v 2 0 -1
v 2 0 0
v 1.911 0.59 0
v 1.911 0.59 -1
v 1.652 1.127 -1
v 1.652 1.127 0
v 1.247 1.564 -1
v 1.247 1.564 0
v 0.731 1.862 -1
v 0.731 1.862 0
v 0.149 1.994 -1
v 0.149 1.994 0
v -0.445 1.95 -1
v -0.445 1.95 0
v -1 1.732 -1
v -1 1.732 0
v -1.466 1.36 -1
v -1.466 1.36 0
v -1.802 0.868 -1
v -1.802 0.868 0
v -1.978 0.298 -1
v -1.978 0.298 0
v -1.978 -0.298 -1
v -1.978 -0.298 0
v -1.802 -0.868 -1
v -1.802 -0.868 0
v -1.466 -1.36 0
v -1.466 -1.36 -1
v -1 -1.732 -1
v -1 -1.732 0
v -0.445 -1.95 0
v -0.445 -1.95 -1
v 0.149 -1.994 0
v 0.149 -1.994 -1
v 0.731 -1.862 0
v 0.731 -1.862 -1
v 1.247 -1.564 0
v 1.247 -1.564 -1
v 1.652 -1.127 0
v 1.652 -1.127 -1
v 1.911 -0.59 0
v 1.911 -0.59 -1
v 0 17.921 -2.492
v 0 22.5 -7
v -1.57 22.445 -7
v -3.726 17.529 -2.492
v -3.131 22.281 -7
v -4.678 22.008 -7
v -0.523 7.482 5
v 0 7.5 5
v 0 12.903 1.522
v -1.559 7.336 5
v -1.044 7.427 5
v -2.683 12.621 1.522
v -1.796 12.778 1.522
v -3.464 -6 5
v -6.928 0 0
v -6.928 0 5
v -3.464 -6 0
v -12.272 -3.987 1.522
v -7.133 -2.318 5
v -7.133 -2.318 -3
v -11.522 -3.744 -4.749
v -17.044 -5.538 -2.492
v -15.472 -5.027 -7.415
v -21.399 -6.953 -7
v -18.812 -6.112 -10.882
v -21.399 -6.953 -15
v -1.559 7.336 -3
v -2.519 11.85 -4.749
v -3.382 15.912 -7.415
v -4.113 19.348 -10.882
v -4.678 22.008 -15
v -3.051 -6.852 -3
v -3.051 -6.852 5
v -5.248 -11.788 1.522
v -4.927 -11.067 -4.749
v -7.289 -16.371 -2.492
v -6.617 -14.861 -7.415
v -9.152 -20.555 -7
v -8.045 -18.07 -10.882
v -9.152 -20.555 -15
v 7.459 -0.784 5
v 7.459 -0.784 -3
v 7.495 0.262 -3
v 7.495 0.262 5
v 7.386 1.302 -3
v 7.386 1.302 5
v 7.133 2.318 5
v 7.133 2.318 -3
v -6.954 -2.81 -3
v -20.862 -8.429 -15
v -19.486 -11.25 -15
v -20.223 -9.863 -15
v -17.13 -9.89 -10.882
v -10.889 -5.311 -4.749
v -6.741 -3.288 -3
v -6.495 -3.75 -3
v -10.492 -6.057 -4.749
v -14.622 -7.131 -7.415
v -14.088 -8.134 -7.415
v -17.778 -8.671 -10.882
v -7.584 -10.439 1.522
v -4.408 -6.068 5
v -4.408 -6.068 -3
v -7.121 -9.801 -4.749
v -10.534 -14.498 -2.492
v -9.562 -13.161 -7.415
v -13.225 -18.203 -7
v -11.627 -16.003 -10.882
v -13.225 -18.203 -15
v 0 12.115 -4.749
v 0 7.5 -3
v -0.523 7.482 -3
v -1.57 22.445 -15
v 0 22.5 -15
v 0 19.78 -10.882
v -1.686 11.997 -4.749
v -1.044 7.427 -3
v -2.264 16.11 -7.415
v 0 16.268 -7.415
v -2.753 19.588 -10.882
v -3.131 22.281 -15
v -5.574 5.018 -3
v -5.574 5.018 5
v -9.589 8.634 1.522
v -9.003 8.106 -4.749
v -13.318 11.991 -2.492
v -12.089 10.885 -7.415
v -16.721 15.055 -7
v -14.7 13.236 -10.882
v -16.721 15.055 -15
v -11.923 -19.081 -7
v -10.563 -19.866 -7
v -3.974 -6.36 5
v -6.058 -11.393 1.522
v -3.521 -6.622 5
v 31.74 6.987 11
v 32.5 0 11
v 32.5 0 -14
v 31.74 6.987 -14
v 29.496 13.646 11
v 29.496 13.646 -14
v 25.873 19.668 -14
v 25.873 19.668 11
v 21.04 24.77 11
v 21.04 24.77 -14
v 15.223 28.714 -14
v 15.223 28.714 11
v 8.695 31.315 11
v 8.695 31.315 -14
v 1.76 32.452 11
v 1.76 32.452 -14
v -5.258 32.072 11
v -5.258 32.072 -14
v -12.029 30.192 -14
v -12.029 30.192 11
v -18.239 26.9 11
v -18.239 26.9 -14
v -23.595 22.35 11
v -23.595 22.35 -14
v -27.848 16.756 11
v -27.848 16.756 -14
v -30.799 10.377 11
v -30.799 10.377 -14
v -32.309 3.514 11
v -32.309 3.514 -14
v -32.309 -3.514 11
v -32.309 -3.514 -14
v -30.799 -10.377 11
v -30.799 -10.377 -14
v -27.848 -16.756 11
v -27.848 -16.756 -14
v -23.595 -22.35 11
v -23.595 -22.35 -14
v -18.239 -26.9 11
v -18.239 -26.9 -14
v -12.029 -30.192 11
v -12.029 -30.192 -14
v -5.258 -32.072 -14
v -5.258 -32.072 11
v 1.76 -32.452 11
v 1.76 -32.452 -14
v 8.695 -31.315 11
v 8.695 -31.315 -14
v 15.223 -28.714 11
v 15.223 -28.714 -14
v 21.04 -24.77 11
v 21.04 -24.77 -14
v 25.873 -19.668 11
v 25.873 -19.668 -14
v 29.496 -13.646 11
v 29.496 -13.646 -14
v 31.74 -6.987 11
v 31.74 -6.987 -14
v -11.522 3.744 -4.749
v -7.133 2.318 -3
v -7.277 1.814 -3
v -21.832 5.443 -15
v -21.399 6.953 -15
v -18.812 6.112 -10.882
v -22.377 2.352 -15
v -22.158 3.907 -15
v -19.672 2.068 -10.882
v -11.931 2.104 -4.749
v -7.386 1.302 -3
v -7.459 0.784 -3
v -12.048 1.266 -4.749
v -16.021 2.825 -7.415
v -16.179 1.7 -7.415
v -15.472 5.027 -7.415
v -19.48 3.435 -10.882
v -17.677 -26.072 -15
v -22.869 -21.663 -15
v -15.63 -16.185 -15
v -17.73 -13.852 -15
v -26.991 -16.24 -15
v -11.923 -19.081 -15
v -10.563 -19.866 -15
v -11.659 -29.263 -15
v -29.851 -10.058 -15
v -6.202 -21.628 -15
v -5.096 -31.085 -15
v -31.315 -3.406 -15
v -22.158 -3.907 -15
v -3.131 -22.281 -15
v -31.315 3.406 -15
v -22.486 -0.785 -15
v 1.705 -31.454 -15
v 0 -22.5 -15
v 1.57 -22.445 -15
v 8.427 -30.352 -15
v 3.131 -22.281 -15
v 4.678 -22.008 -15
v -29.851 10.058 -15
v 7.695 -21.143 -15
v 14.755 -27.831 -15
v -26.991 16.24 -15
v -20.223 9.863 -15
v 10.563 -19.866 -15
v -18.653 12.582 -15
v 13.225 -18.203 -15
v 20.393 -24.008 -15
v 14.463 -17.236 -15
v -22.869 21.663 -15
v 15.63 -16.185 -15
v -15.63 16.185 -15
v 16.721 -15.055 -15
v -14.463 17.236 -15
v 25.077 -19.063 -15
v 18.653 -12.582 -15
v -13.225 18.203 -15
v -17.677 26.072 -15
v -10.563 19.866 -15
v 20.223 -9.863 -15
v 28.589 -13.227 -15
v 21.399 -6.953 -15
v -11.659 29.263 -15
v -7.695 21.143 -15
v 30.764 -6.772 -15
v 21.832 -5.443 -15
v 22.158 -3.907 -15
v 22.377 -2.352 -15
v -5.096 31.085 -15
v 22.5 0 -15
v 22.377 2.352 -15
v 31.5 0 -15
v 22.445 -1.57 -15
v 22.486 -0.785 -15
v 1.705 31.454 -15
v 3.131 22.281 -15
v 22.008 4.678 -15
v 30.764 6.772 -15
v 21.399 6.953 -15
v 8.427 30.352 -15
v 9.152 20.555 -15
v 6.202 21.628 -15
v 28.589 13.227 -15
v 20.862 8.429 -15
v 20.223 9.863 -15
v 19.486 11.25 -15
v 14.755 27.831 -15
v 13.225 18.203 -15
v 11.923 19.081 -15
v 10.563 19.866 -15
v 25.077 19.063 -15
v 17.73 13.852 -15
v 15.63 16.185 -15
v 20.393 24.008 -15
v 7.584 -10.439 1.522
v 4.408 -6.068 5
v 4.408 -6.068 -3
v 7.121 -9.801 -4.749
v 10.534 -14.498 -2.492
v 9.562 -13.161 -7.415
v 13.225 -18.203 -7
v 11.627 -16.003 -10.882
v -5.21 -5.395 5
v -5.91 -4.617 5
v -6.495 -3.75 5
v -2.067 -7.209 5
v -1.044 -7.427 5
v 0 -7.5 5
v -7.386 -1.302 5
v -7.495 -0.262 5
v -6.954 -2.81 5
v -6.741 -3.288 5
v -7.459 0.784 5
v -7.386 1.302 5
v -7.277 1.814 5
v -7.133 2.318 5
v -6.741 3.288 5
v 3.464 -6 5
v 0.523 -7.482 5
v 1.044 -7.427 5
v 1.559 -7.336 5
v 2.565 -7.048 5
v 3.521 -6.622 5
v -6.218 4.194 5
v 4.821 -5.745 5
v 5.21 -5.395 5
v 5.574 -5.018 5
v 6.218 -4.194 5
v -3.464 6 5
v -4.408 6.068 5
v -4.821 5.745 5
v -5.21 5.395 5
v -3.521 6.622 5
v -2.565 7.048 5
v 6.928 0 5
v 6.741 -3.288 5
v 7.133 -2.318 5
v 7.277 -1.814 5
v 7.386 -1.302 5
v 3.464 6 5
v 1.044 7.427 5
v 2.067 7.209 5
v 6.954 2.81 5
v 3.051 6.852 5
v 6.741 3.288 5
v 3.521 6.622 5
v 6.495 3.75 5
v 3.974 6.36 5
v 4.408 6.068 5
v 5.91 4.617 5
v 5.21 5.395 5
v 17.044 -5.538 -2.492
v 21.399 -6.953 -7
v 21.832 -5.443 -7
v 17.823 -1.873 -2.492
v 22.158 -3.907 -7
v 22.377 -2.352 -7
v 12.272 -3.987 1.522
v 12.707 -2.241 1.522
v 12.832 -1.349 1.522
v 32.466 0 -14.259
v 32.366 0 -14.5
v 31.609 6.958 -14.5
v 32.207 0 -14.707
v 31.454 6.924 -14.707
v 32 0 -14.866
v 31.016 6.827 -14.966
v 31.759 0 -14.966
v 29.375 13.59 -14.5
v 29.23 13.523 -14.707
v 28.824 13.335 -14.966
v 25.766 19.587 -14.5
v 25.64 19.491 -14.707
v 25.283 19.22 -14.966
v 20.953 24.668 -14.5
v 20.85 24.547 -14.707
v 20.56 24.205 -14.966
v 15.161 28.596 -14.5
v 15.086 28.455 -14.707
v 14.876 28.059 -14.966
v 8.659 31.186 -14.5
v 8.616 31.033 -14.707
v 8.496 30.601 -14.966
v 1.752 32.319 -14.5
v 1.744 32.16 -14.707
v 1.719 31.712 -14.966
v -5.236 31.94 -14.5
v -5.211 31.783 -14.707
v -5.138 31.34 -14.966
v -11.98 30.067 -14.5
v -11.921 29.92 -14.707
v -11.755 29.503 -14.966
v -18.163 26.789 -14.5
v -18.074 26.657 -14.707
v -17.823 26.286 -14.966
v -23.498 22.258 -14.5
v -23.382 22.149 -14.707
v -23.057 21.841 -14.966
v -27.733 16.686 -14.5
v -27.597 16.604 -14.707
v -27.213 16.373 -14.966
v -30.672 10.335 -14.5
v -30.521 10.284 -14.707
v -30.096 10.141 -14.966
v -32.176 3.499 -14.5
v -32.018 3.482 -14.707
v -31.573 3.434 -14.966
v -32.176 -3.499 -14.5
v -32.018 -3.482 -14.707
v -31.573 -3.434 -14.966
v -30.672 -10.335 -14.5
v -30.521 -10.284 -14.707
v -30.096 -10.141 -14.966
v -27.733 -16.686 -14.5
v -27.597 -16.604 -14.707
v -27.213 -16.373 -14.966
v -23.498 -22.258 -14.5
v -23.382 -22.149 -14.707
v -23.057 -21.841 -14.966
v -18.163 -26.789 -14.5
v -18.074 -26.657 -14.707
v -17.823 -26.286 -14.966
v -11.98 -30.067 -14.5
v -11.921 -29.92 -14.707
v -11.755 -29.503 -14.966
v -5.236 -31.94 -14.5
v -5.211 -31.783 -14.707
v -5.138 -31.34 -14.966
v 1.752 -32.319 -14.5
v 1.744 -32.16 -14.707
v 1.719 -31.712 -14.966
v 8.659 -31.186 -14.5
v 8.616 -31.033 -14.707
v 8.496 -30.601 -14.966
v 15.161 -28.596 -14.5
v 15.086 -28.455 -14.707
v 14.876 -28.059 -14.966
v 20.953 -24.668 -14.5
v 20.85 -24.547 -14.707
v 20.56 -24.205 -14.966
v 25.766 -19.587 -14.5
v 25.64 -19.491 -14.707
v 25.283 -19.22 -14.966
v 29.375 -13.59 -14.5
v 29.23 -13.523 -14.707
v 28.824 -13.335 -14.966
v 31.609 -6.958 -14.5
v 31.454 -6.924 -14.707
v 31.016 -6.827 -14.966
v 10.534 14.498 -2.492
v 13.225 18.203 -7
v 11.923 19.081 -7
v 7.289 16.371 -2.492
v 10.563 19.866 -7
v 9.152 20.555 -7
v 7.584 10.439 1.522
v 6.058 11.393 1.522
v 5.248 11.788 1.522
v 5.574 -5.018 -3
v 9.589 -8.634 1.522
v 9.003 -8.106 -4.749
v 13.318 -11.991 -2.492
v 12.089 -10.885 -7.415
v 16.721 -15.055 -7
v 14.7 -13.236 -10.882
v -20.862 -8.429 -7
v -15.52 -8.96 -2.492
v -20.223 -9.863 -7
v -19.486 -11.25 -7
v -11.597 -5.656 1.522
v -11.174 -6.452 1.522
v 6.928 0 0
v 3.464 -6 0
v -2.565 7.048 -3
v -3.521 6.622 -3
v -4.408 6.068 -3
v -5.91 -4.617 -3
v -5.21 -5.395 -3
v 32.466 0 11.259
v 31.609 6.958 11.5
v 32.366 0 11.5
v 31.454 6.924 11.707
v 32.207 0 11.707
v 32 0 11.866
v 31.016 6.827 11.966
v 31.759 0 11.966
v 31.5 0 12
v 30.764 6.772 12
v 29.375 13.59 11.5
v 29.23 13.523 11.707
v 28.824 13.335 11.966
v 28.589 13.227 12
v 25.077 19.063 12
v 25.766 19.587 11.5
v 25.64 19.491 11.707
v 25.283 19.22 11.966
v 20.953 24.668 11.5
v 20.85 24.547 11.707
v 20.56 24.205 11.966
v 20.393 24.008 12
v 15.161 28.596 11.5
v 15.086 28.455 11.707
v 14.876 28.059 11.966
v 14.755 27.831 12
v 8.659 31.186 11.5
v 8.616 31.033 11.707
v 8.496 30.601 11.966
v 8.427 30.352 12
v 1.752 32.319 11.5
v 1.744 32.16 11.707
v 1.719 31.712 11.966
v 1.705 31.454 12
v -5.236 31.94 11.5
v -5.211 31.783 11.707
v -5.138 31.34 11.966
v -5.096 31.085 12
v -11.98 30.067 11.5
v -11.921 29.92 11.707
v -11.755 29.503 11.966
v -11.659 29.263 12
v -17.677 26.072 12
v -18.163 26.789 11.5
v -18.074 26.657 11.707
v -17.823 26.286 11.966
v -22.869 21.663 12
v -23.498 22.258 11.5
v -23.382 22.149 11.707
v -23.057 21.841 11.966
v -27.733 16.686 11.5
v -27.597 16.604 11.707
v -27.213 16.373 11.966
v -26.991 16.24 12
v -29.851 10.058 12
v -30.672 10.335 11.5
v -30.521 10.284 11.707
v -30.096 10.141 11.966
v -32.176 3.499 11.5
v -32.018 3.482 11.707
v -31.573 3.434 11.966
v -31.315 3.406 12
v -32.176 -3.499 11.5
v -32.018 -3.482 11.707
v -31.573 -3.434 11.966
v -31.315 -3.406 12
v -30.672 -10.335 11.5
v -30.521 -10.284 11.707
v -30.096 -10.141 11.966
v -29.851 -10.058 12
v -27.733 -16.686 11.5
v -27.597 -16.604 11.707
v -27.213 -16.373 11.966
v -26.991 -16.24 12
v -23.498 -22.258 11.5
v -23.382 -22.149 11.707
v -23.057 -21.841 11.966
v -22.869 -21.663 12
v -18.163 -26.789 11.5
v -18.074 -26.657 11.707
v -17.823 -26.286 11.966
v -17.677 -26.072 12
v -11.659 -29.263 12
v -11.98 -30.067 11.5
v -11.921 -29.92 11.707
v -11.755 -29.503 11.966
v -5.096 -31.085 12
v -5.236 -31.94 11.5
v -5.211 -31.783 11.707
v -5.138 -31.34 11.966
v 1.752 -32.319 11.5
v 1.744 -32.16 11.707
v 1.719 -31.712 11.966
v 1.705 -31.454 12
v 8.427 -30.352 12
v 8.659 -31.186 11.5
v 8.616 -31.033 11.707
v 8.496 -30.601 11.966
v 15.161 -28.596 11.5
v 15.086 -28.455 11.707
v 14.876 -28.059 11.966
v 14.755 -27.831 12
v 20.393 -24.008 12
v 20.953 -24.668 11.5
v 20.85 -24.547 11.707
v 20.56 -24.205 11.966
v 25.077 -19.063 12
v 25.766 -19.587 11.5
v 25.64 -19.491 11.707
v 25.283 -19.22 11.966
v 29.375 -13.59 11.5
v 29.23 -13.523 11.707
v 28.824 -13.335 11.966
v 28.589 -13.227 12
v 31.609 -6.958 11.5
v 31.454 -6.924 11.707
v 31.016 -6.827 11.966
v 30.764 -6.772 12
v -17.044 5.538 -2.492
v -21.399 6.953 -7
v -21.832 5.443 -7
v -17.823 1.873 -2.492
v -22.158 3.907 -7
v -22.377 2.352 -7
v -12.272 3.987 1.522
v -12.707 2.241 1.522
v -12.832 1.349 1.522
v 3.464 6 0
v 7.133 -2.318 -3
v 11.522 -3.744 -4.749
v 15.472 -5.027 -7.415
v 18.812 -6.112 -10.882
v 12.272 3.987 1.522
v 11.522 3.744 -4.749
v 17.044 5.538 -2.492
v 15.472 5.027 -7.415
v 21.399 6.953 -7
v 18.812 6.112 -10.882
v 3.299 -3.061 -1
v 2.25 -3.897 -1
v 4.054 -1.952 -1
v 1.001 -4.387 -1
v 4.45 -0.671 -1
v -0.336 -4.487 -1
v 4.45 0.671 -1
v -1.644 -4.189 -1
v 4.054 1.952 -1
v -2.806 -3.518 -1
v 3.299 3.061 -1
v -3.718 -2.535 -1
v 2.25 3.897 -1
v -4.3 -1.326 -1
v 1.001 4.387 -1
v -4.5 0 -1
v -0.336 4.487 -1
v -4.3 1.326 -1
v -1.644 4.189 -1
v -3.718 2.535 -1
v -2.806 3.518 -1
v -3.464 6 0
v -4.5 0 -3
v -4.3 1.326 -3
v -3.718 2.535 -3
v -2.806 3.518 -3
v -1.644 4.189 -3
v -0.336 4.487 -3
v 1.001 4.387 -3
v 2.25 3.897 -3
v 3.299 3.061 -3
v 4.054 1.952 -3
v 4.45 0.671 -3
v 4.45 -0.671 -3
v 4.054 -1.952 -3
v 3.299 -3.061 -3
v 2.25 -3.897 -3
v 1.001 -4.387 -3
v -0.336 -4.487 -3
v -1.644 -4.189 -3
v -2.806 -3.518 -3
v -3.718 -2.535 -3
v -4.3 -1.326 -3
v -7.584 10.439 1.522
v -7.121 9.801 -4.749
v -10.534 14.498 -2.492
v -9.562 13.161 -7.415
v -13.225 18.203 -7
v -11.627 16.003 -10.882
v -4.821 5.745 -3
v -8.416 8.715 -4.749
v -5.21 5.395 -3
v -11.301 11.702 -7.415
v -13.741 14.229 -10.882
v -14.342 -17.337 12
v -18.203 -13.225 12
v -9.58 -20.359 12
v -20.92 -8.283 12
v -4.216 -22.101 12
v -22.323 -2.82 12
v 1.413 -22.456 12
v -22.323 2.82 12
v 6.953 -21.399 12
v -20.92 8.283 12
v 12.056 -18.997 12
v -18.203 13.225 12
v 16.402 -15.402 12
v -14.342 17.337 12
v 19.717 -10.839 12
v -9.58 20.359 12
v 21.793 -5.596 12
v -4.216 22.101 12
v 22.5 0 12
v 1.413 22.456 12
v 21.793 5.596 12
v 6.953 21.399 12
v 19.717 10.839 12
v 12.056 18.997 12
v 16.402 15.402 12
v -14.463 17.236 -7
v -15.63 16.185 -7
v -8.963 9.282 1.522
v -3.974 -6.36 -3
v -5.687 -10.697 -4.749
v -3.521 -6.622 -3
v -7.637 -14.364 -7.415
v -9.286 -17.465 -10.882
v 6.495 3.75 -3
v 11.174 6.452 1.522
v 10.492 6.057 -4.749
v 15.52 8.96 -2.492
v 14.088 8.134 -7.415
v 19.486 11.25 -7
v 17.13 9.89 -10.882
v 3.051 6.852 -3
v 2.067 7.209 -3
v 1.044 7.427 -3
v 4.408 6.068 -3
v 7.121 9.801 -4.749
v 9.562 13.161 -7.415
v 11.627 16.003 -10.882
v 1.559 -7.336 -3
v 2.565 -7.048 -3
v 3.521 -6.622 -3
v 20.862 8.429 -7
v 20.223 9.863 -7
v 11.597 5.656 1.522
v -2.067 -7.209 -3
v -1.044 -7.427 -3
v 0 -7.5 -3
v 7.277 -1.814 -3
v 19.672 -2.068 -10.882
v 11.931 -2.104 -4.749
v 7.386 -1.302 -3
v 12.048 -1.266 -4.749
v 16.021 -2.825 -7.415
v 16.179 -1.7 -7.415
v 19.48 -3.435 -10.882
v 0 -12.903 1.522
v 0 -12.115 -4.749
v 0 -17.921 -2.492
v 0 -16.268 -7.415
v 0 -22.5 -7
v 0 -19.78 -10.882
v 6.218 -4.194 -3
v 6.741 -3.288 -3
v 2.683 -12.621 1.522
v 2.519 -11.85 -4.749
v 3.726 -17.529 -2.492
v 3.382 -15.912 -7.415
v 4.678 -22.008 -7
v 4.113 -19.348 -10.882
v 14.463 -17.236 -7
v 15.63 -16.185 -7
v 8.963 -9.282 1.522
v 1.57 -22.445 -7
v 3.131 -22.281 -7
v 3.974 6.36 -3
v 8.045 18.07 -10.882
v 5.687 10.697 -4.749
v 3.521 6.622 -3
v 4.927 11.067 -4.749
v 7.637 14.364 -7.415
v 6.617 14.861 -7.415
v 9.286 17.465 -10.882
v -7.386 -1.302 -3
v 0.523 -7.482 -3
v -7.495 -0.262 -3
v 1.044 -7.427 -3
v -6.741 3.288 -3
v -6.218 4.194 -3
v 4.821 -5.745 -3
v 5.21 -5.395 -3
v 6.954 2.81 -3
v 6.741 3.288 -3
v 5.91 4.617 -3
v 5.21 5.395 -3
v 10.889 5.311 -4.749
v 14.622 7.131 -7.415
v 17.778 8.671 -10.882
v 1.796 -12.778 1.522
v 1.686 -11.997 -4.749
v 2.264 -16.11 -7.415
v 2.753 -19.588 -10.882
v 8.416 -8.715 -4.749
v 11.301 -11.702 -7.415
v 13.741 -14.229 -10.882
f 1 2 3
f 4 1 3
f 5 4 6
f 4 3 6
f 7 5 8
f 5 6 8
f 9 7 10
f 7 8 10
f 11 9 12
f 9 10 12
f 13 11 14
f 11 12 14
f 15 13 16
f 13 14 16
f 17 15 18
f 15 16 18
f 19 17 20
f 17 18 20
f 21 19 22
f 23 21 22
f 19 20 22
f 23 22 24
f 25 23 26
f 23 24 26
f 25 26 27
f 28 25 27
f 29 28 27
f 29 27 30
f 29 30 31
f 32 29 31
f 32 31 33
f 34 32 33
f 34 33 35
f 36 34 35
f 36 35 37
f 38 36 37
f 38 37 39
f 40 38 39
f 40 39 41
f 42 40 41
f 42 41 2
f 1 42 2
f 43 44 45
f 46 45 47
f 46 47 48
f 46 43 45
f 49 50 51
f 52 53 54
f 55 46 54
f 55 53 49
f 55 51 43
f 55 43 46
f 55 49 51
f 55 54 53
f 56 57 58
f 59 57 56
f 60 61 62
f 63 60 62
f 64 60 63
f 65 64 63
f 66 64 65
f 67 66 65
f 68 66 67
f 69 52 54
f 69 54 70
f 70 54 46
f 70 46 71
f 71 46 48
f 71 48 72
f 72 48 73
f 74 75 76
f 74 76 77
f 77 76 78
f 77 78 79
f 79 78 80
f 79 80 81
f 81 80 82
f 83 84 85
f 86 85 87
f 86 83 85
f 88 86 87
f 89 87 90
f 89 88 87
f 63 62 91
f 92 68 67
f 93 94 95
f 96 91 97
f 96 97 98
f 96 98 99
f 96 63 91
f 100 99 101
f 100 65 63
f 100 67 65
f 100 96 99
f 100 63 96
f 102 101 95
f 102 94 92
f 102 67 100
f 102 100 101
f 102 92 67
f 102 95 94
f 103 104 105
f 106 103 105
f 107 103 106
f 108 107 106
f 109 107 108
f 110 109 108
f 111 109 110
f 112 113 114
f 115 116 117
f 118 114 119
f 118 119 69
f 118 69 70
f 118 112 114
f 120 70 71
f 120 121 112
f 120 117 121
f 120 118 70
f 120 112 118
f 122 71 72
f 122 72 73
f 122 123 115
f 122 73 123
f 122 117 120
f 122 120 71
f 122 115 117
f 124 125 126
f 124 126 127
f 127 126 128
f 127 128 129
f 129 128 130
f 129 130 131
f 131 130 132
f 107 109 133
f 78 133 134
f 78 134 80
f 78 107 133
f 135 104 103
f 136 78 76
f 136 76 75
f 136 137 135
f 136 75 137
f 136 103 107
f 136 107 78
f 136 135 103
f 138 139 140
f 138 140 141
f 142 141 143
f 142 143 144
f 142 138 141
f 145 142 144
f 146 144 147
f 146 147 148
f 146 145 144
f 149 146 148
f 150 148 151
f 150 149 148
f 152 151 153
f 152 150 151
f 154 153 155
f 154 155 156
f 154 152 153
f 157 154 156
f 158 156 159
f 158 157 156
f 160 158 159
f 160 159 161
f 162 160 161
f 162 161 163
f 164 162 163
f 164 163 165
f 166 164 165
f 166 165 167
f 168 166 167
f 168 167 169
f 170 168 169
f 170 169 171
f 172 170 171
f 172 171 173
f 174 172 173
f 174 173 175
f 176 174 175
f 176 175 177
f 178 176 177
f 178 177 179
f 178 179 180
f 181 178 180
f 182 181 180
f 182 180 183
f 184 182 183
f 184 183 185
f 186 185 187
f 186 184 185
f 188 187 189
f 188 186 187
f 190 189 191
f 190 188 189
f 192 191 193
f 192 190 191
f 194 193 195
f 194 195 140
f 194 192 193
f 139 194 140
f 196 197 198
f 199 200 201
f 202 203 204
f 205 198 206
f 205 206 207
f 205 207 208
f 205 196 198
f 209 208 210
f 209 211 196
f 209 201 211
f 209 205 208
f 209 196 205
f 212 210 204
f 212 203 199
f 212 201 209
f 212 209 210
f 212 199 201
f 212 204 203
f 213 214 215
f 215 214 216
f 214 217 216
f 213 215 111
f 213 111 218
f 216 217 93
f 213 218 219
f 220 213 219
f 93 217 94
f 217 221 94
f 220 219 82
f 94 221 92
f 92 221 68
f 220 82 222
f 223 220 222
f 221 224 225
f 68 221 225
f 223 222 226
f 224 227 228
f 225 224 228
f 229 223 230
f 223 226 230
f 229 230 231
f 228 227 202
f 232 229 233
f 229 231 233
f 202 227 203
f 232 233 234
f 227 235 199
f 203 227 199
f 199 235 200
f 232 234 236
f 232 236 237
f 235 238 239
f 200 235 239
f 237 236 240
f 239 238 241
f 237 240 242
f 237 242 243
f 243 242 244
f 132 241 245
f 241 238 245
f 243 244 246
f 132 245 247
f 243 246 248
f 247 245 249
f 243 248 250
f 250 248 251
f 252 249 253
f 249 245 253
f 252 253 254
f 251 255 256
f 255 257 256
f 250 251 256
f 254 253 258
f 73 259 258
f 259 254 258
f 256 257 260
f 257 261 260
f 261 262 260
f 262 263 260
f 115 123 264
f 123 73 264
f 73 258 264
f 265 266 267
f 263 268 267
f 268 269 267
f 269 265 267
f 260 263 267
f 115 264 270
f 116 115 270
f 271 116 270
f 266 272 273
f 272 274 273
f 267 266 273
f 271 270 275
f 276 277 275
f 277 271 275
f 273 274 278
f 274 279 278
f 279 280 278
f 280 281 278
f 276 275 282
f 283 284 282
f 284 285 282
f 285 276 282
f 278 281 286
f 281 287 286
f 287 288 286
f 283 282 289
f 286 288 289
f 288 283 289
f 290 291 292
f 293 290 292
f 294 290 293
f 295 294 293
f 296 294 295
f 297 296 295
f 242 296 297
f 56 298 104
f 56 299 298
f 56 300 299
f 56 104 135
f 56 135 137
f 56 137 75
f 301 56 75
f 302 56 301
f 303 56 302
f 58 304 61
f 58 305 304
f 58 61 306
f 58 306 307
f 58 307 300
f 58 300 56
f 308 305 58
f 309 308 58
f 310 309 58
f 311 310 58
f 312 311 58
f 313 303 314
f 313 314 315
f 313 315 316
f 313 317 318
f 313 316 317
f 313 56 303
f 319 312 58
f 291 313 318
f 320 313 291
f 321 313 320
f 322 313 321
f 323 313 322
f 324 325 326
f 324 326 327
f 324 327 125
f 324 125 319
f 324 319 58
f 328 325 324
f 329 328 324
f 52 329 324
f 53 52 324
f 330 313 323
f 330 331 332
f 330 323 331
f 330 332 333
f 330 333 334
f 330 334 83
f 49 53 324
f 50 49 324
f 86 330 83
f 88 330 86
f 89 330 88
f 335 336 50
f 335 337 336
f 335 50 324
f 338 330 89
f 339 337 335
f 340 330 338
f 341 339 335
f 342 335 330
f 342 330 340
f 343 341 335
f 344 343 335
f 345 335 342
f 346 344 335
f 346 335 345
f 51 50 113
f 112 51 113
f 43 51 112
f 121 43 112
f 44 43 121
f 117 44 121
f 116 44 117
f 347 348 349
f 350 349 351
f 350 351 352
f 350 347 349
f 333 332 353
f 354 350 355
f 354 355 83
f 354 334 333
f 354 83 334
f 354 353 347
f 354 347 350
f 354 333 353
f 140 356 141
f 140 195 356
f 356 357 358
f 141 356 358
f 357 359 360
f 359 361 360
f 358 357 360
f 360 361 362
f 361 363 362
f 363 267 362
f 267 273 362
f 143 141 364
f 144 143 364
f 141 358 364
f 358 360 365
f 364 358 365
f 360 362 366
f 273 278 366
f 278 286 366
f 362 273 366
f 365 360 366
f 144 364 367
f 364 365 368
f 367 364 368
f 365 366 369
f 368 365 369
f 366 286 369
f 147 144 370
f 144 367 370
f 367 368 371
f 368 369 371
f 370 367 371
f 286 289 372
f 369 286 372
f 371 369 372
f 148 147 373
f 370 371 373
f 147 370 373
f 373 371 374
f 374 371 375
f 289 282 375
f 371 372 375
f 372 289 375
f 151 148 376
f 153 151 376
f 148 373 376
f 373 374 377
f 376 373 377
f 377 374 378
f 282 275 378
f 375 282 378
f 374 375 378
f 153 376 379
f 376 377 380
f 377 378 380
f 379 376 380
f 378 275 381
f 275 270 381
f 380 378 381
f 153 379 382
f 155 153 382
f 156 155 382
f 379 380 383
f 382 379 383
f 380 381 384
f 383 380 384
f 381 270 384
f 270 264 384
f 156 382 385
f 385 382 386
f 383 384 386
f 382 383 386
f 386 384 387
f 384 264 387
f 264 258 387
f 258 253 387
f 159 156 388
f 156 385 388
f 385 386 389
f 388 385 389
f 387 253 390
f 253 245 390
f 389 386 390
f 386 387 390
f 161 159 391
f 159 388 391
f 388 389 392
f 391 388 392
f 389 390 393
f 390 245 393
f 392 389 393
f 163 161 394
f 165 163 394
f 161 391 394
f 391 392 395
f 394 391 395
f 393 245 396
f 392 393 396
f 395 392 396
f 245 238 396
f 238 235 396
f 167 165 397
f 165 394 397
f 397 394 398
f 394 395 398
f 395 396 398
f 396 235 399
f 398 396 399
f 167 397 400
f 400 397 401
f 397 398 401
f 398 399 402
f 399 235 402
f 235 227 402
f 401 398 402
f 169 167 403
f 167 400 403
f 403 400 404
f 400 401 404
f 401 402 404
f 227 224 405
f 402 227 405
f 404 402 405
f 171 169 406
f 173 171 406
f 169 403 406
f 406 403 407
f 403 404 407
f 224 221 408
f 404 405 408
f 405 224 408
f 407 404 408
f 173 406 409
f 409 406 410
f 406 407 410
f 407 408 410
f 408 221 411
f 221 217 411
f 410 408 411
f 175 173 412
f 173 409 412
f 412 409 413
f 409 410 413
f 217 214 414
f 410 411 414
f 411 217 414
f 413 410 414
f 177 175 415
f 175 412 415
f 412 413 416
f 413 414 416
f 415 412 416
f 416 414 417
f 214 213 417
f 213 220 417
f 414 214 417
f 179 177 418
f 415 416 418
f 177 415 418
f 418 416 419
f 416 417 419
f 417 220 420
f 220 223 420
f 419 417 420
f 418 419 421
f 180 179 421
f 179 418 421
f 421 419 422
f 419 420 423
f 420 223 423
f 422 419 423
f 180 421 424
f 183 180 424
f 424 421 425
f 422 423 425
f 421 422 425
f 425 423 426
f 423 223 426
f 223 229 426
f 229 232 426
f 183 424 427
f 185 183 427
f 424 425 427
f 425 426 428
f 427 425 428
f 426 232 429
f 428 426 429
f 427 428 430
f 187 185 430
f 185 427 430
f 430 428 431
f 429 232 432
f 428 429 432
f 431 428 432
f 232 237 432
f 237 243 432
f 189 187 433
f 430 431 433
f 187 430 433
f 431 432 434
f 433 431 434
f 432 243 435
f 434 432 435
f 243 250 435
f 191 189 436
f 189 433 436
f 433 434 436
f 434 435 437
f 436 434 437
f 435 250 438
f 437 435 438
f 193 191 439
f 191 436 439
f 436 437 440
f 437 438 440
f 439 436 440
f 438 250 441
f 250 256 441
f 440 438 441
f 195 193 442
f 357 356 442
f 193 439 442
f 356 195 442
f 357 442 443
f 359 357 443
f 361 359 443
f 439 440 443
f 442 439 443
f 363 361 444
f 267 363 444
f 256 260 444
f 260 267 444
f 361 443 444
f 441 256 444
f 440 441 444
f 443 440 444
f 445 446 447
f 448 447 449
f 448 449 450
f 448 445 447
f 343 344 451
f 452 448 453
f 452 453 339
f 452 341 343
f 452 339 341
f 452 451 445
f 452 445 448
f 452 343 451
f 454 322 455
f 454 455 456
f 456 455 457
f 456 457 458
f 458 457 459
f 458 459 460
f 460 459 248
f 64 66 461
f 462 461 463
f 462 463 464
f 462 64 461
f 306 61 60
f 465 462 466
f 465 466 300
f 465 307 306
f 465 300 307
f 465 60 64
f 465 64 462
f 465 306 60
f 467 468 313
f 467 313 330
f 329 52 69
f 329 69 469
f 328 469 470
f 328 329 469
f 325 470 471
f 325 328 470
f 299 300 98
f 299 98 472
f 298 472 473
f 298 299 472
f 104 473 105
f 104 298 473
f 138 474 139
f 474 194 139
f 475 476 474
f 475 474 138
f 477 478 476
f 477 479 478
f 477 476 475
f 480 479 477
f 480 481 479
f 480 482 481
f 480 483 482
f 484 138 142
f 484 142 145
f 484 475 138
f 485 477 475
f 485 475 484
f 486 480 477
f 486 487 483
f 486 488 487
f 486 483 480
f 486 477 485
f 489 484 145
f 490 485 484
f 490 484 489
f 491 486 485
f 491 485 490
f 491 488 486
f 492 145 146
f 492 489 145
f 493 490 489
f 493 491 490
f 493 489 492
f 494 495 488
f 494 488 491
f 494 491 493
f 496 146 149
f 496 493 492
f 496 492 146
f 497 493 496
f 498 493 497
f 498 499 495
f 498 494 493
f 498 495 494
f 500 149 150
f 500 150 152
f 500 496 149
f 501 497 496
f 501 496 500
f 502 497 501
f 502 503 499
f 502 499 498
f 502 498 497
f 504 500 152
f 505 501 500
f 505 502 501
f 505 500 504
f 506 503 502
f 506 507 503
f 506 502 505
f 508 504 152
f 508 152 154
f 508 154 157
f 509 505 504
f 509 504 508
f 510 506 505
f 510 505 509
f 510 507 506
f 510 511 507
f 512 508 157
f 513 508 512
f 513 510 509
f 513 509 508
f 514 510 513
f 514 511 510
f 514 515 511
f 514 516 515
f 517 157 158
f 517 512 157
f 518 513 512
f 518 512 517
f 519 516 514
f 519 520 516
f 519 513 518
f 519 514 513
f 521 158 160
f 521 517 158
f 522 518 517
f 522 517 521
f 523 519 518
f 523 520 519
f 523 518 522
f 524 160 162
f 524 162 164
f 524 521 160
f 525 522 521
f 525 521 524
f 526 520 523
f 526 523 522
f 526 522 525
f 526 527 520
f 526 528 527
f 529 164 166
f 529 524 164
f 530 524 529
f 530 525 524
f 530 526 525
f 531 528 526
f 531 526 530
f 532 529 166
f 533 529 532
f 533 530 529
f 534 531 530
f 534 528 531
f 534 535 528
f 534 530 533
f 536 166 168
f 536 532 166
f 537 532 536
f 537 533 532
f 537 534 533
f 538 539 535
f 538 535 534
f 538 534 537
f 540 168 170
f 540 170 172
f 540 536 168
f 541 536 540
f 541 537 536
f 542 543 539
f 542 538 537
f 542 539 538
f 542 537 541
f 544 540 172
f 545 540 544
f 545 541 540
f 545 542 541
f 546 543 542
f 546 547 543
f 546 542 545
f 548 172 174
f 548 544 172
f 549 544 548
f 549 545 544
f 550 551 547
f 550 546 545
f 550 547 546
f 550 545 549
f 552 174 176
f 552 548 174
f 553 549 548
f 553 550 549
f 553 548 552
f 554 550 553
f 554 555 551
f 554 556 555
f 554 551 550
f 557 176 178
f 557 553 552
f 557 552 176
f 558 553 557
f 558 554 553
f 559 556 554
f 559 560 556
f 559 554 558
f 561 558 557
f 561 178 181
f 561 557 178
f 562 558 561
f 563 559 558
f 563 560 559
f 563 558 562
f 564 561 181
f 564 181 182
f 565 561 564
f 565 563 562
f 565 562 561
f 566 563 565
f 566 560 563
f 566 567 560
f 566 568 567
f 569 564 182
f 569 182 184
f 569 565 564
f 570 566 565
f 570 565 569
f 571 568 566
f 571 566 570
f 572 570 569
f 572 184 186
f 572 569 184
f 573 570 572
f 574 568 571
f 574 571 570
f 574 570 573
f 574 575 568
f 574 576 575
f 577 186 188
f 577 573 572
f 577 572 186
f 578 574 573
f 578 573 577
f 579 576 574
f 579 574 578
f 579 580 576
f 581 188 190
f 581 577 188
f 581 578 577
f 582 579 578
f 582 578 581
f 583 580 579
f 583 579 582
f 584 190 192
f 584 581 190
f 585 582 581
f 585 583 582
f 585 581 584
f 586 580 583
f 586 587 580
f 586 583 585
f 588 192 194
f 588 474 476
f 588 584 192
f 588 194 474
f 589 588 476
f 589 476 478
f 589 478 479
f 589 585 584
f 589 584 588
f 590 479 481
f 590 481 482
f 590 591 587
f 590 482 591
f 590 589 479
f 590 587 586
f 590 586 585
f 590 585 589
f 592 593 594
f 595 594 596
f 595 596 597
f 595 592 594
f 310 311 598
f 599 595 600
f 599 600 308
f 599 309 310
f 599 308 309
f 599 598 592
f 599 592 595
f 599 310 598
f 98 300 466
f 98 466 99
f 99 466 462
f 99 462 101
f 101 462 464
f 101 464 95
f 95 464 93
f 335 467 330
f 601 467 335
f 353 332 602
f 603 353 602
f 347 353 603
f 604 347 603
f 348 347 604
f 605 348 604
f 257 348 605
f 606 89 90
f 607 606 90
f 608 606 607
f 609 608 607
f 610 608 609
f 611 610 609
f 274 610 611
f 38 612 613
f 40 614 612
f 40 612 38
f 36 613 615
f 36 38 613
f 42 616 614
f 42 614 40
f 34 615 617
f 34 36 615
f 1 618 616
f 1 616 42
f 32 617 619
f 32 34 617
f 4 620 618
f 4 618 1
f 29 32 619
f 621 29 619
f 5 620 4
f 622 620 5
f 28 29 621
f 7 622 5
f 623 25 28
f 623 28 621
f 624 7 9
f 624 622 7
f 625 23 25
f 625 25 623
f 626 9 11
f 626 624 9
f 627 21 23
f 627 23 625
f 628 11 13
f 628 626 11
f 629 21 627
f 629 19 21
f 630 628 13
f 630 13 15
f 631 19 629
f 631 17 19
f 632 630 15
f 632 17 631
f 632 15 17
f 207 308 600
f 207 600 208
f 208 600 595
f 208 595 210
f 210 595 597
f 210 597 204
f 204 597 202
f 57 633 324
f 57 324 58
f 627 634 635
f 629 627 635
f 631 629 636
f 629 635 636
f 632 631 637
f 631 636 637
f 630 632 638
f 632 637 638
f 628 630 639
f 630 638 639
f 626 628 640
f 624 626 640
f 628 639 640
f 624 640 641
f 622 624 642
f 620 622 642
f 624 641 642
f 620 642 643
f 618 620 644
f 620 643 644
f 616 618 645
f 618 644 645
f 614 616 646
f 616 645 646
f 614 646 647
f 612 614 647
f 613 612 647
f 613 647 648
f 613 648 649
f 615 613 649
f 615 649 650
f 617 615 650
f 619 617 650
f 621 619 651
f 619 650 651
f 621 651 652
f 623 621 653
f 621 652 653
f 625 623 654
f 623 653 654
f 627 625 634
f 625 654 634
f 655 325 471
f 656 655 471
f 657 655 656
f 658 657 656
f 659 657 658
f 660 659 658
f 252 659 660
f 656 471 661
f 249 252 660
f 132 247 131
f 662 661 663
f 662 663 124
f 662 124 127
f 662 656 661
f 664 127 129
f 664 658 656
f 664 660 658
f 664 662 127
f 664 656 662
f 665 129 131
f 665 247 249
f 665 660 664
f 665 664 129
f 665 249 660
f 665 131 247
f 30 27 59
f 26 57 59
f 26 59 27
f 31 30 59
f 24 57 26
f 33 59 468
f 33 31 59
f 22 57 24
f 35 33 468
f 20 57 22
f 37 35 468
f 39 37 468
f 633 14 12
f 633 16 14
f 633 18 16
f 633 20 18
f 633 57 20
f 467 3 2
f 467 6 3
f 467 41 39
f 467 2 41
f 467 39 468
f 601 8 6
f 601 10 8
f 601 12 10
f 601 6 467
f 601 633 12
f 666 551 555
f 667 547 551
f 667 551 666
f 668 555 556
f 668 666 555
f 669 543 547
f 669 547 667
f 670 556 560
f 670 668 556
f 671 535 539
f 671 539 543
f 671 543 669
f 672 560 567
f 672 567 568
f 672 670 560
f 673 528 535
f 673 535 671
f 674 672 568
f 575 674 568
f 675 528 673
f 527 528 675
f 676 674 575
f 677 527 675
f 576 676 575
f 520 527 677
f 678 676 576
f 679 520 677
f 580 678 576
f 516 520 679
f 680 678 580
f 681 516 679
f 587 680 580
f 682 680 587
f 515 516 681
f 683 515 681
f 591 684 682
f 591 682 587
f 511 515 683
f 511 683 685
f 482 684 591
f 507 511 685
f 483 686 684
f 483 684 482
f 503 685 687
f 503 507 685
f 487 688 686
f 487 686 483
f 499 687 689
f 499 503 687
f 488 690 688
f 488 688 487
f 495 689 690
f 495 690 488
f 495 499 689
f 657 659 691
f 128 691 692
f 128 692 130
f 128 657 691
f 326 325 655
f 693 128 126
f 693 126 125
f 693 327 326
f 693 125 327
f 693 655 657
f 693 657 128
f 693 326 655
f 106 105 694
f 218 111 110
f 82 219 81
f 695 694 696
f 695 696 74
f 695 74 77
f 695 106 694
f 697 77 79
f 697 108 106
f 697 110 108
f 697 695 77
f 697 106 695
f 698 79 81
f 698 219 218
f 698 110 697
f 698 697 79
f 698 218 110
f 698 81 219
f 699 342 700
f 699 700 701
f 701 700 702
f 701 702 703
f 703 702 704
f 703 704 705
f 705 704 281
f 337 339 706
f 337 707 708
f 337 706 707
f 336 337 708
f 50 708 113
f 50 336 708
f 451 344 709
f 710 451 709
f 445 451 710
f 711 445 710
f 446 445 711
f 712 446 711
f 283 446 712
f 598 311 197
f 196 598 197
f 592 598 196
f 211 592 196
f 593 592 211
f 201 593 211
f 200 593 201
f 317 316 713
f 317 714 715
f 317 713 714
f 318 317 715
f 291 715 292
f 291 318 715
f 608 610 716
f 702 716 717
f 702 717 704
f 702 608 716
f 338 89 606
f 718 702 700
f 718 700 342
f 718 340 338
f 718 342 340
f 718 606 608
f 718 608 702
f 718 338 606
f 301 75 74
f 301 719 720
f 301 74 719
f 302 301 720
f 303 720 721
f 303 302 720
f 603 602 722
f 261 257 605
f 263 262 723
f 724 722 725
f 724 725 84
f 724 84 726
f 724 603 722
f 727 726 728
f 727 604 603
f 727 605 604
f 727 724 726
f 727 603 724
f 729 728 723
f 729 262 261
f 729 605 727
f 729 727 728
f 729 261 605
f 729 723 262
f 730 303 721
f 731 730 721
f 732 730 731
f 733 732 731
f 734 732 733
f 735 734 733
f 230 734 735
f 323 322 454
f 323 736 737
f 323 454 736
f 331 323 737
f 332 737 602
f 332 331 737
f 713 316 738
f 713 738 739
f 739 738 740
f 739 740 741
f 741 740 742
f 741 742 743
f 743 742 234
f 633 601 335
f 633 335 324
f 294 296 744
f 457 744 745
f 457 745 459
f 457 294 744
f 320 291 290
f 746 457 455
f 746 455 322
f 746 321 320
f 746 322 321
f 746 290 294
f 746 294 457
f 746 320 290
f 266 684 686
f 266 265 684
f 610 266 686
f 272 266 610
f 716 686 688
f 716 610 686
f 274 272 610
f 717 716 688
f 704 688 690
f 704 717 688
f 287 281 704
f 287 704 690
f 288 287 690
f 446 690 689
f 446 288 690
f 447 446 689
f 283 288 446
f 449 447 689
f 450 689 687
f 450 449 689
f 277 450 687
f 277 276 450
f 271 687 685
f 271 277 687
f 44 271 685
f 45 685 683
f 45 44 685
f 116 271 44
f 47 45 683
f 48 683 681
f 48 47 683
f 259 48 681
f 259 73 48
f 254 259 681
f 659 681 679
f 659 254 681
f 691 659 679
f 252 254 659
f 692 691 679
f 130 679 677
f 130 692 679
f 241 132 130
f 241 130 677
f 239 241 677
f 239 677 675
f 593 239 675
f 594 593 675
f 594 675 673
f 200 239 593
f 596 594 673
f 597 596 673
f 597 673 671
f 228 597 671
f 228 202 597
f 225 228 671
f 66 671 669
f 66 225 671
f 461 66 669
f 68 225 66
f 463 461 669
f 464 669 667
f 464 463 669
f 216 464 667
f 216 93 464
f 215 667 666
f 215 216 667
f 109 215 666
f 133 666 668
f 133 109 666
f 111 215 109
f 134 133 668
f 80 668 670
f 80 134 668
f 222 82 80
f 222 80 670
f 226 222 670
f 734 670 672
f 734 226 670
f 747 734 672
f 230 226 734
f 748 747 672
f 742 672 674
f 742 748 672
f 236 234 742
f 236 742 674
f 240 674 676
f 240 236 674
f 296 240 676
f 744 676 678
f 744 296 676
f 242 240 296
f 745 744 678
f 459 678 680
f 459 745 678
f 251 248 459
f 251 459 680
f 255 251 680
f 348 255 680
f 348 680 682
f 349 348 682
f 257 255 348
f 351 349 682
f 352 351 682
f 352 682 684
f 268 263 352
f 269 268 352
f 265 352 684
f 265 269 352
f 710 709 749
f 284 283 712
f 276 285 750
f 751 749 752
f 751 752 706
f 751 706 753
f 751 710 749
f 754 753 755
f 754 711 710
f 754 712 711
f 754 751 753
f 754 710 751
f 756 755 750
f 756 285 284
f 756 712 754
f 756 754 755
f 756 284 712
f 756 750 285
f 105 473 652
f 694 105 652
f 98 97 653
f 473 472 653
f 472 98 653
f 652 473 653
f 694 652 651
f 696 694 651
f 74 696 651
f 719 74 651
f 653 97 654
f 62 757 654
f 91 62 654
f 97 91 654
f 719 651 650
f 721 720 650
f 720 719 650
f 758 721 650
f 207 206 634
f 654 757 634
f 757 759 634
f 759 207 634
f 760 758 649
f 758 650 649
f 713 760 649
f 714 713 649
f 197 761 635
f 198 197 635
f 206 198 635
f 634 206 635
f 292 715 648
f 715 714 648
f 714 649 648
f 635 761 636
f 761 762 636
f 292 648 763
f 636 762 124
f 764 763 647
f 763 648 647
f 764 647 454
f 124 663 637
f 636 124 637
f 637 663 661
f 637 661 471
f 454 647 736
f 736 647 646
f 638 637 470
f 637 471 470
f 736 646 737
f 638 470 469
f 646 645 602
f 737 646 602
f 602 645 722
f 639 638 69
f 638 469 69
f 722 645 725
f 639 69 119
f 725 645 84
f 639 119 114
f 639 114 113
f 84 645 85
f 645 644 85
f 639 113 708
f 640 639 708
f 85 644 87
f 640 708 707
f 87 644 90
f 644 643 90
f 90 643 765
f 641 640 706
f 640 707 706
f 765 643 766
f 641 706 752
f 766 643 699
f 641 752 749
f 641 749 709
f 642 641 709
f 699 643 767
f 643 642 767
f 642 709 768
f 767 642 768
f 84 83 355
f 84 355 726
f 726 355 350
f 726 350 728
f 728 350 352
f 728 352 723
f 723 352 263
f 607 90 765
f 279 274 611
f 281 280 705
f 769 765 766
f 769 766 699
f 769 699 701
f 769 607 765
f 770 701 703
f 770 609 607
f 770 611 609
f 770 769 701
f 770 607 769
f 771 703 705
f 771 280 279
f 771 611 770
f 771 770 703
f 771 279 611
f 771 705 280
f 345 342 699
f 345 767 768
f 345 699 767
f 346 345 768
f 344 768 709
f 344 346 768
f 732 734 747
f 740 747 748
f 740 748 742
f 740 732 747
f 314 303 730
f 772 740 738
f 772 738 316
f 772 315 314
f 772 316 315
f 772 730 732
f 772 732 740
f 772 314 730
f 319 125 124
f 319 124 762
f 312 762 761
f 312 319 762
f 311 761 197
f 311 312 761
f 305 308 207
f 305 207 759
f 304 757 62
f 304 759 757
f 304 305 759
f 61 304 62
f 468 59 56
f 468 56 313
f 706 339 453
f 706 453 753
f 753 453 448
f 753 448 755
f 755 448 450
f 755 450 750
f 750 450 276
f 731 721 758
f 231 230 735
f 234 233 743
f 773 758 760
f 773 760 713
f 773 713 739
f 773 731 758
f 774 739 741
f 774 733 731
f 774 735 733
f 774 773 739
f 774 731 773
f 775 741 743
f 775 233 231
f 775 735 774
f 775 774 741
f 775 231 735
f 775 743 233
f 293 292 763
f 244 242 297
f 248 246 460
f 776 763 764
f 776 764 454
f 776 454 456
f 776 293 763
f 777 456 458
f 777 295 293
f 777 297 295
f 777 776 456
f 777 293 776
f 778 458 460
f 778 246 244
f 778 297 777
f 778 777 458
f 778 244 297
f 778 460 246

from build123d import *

# Parameters (mm, degrees)
SKETCH_1_R               = 7.5
EXTRUDE_1_DEPTH          = 5
SKETCH_2_R               = 7.5
SKETCH_2_R_2             = 2
EXTRUDE_2_DEPTH          = 3
SKETCH_3_R               = 32.5
SKETCH_3_R_2             = 22.5
EXTRUDE_3_DEPTH          = 12
EXTRUDE_3_DEPTH_BACK     = 15
REVOLVE_1_ANGLE          = 12
PATTERN_CIRCULAR_1_COUNT = 10
SKETCH_5_R               = 4.5
CUT_EXTRUDE_1_DEPTH      = 2
FILLET_1_R               = 1


with BuildPart() as part:
    # 草图1 → 凸台-拉伸1 (new body)
    with BuildSketch(Plane.XY):
        Circle(SKETCH_1_R)
        Polygon((-6.92820323, 0), (-3.464101615, -6), (3.464101615, -6), (6.92820323, 0), (3.464101615, 6), (-3.464101615, 6), align=None, mode=Mode.SUBTRACT)
    extrude(amount=EXTRUDE_1_DEPTH)

    # 草图2 → 凸台-拉伸2 (add)
    with BuildSketch(Plane.XY):
        Circle(SKETCH_2_R)
        Circle(SKETCH_2_R_2, mode=Mode.SUBTRACT)
    extrude(amount=-EXTRUDE_2_DEPTH)



with BuildPart() as body_2:
    # 草图3 → 凸台-拉伸3 (new body, two sides)
    with BuildSketch(Plane.XY) as extrude_3_sk:
        Circle(SKETCH_3_R)
        Circle(SKETCH_3_R_2, mode=Mode.SUBTRACT)
    extrude(amount=EXTRUDE_3_DEPTH)
    extrude(extrude_3_sk.sketch, amount=-EXTRUDE_3_DEPTH_BACK)


with BuildPart() as part_1:
    add(part.part)

    add(body_2.part)  # 旋转1 merges body 2
    # 草图4 → 旋转1 (revolve)
    with BuildSketch(Plane(origin=(0, 0, 0), x_dir=(0, 0, -1), z_dir=(1, 0, 0))):
        with BuildLine():
            Line((-5, 7.5), (3, 7.5))
            ThreePointArc((3, 7.5), (7.415092079, 16.267926336), (15, 22.5))
            Line((15, 22.5), (7, 22.5))
            ThreePointArc((7, 22.5), (0.420622129, 15.463502297), (-5, 7.5))
        make_face()
    revolve_1 = revolve(axis=Axis((0, 0, -16.35), (0, 0, 1)), revolution_arc=REVOLVE_1_ANGLE)

    # 阵列(圆周)1: 旋转1 ×10 about axis
    pattern_circular_1_axis = Axis((0, 0, 0), (0, 0, 1))
    for i in range(1, PATTERN_CIRCULAR_1_COUNT):
        add(revolve_1.rotate(pattern_circular_1_axis, i * 360 / PATTERN_CIRCULAR_1_COUNT))

    # 草图5 → 切除-拉伸1 (cut)
    with BuildSketch(Plane(origin=(0, 0, -3), x_dir=(-1, 0, 0), z_dir=(0, 0, -1))):
        Circle(SKETCH_5_R)
    extrude(amount=-CUT_EXTRUDE_1_DEPTH, mode=Mode.SUBTRACT)

    # 圆角1
    fillet_1_edges = [part_1.edges().sort_by_distance(p)[0] for p in [
        (-32.5, 0, -15),
        (-32.5, 0, 12),
    ]]
    fillet(fillet_1_edges, radius=FILLET_1_R)


solid = part_1.part
